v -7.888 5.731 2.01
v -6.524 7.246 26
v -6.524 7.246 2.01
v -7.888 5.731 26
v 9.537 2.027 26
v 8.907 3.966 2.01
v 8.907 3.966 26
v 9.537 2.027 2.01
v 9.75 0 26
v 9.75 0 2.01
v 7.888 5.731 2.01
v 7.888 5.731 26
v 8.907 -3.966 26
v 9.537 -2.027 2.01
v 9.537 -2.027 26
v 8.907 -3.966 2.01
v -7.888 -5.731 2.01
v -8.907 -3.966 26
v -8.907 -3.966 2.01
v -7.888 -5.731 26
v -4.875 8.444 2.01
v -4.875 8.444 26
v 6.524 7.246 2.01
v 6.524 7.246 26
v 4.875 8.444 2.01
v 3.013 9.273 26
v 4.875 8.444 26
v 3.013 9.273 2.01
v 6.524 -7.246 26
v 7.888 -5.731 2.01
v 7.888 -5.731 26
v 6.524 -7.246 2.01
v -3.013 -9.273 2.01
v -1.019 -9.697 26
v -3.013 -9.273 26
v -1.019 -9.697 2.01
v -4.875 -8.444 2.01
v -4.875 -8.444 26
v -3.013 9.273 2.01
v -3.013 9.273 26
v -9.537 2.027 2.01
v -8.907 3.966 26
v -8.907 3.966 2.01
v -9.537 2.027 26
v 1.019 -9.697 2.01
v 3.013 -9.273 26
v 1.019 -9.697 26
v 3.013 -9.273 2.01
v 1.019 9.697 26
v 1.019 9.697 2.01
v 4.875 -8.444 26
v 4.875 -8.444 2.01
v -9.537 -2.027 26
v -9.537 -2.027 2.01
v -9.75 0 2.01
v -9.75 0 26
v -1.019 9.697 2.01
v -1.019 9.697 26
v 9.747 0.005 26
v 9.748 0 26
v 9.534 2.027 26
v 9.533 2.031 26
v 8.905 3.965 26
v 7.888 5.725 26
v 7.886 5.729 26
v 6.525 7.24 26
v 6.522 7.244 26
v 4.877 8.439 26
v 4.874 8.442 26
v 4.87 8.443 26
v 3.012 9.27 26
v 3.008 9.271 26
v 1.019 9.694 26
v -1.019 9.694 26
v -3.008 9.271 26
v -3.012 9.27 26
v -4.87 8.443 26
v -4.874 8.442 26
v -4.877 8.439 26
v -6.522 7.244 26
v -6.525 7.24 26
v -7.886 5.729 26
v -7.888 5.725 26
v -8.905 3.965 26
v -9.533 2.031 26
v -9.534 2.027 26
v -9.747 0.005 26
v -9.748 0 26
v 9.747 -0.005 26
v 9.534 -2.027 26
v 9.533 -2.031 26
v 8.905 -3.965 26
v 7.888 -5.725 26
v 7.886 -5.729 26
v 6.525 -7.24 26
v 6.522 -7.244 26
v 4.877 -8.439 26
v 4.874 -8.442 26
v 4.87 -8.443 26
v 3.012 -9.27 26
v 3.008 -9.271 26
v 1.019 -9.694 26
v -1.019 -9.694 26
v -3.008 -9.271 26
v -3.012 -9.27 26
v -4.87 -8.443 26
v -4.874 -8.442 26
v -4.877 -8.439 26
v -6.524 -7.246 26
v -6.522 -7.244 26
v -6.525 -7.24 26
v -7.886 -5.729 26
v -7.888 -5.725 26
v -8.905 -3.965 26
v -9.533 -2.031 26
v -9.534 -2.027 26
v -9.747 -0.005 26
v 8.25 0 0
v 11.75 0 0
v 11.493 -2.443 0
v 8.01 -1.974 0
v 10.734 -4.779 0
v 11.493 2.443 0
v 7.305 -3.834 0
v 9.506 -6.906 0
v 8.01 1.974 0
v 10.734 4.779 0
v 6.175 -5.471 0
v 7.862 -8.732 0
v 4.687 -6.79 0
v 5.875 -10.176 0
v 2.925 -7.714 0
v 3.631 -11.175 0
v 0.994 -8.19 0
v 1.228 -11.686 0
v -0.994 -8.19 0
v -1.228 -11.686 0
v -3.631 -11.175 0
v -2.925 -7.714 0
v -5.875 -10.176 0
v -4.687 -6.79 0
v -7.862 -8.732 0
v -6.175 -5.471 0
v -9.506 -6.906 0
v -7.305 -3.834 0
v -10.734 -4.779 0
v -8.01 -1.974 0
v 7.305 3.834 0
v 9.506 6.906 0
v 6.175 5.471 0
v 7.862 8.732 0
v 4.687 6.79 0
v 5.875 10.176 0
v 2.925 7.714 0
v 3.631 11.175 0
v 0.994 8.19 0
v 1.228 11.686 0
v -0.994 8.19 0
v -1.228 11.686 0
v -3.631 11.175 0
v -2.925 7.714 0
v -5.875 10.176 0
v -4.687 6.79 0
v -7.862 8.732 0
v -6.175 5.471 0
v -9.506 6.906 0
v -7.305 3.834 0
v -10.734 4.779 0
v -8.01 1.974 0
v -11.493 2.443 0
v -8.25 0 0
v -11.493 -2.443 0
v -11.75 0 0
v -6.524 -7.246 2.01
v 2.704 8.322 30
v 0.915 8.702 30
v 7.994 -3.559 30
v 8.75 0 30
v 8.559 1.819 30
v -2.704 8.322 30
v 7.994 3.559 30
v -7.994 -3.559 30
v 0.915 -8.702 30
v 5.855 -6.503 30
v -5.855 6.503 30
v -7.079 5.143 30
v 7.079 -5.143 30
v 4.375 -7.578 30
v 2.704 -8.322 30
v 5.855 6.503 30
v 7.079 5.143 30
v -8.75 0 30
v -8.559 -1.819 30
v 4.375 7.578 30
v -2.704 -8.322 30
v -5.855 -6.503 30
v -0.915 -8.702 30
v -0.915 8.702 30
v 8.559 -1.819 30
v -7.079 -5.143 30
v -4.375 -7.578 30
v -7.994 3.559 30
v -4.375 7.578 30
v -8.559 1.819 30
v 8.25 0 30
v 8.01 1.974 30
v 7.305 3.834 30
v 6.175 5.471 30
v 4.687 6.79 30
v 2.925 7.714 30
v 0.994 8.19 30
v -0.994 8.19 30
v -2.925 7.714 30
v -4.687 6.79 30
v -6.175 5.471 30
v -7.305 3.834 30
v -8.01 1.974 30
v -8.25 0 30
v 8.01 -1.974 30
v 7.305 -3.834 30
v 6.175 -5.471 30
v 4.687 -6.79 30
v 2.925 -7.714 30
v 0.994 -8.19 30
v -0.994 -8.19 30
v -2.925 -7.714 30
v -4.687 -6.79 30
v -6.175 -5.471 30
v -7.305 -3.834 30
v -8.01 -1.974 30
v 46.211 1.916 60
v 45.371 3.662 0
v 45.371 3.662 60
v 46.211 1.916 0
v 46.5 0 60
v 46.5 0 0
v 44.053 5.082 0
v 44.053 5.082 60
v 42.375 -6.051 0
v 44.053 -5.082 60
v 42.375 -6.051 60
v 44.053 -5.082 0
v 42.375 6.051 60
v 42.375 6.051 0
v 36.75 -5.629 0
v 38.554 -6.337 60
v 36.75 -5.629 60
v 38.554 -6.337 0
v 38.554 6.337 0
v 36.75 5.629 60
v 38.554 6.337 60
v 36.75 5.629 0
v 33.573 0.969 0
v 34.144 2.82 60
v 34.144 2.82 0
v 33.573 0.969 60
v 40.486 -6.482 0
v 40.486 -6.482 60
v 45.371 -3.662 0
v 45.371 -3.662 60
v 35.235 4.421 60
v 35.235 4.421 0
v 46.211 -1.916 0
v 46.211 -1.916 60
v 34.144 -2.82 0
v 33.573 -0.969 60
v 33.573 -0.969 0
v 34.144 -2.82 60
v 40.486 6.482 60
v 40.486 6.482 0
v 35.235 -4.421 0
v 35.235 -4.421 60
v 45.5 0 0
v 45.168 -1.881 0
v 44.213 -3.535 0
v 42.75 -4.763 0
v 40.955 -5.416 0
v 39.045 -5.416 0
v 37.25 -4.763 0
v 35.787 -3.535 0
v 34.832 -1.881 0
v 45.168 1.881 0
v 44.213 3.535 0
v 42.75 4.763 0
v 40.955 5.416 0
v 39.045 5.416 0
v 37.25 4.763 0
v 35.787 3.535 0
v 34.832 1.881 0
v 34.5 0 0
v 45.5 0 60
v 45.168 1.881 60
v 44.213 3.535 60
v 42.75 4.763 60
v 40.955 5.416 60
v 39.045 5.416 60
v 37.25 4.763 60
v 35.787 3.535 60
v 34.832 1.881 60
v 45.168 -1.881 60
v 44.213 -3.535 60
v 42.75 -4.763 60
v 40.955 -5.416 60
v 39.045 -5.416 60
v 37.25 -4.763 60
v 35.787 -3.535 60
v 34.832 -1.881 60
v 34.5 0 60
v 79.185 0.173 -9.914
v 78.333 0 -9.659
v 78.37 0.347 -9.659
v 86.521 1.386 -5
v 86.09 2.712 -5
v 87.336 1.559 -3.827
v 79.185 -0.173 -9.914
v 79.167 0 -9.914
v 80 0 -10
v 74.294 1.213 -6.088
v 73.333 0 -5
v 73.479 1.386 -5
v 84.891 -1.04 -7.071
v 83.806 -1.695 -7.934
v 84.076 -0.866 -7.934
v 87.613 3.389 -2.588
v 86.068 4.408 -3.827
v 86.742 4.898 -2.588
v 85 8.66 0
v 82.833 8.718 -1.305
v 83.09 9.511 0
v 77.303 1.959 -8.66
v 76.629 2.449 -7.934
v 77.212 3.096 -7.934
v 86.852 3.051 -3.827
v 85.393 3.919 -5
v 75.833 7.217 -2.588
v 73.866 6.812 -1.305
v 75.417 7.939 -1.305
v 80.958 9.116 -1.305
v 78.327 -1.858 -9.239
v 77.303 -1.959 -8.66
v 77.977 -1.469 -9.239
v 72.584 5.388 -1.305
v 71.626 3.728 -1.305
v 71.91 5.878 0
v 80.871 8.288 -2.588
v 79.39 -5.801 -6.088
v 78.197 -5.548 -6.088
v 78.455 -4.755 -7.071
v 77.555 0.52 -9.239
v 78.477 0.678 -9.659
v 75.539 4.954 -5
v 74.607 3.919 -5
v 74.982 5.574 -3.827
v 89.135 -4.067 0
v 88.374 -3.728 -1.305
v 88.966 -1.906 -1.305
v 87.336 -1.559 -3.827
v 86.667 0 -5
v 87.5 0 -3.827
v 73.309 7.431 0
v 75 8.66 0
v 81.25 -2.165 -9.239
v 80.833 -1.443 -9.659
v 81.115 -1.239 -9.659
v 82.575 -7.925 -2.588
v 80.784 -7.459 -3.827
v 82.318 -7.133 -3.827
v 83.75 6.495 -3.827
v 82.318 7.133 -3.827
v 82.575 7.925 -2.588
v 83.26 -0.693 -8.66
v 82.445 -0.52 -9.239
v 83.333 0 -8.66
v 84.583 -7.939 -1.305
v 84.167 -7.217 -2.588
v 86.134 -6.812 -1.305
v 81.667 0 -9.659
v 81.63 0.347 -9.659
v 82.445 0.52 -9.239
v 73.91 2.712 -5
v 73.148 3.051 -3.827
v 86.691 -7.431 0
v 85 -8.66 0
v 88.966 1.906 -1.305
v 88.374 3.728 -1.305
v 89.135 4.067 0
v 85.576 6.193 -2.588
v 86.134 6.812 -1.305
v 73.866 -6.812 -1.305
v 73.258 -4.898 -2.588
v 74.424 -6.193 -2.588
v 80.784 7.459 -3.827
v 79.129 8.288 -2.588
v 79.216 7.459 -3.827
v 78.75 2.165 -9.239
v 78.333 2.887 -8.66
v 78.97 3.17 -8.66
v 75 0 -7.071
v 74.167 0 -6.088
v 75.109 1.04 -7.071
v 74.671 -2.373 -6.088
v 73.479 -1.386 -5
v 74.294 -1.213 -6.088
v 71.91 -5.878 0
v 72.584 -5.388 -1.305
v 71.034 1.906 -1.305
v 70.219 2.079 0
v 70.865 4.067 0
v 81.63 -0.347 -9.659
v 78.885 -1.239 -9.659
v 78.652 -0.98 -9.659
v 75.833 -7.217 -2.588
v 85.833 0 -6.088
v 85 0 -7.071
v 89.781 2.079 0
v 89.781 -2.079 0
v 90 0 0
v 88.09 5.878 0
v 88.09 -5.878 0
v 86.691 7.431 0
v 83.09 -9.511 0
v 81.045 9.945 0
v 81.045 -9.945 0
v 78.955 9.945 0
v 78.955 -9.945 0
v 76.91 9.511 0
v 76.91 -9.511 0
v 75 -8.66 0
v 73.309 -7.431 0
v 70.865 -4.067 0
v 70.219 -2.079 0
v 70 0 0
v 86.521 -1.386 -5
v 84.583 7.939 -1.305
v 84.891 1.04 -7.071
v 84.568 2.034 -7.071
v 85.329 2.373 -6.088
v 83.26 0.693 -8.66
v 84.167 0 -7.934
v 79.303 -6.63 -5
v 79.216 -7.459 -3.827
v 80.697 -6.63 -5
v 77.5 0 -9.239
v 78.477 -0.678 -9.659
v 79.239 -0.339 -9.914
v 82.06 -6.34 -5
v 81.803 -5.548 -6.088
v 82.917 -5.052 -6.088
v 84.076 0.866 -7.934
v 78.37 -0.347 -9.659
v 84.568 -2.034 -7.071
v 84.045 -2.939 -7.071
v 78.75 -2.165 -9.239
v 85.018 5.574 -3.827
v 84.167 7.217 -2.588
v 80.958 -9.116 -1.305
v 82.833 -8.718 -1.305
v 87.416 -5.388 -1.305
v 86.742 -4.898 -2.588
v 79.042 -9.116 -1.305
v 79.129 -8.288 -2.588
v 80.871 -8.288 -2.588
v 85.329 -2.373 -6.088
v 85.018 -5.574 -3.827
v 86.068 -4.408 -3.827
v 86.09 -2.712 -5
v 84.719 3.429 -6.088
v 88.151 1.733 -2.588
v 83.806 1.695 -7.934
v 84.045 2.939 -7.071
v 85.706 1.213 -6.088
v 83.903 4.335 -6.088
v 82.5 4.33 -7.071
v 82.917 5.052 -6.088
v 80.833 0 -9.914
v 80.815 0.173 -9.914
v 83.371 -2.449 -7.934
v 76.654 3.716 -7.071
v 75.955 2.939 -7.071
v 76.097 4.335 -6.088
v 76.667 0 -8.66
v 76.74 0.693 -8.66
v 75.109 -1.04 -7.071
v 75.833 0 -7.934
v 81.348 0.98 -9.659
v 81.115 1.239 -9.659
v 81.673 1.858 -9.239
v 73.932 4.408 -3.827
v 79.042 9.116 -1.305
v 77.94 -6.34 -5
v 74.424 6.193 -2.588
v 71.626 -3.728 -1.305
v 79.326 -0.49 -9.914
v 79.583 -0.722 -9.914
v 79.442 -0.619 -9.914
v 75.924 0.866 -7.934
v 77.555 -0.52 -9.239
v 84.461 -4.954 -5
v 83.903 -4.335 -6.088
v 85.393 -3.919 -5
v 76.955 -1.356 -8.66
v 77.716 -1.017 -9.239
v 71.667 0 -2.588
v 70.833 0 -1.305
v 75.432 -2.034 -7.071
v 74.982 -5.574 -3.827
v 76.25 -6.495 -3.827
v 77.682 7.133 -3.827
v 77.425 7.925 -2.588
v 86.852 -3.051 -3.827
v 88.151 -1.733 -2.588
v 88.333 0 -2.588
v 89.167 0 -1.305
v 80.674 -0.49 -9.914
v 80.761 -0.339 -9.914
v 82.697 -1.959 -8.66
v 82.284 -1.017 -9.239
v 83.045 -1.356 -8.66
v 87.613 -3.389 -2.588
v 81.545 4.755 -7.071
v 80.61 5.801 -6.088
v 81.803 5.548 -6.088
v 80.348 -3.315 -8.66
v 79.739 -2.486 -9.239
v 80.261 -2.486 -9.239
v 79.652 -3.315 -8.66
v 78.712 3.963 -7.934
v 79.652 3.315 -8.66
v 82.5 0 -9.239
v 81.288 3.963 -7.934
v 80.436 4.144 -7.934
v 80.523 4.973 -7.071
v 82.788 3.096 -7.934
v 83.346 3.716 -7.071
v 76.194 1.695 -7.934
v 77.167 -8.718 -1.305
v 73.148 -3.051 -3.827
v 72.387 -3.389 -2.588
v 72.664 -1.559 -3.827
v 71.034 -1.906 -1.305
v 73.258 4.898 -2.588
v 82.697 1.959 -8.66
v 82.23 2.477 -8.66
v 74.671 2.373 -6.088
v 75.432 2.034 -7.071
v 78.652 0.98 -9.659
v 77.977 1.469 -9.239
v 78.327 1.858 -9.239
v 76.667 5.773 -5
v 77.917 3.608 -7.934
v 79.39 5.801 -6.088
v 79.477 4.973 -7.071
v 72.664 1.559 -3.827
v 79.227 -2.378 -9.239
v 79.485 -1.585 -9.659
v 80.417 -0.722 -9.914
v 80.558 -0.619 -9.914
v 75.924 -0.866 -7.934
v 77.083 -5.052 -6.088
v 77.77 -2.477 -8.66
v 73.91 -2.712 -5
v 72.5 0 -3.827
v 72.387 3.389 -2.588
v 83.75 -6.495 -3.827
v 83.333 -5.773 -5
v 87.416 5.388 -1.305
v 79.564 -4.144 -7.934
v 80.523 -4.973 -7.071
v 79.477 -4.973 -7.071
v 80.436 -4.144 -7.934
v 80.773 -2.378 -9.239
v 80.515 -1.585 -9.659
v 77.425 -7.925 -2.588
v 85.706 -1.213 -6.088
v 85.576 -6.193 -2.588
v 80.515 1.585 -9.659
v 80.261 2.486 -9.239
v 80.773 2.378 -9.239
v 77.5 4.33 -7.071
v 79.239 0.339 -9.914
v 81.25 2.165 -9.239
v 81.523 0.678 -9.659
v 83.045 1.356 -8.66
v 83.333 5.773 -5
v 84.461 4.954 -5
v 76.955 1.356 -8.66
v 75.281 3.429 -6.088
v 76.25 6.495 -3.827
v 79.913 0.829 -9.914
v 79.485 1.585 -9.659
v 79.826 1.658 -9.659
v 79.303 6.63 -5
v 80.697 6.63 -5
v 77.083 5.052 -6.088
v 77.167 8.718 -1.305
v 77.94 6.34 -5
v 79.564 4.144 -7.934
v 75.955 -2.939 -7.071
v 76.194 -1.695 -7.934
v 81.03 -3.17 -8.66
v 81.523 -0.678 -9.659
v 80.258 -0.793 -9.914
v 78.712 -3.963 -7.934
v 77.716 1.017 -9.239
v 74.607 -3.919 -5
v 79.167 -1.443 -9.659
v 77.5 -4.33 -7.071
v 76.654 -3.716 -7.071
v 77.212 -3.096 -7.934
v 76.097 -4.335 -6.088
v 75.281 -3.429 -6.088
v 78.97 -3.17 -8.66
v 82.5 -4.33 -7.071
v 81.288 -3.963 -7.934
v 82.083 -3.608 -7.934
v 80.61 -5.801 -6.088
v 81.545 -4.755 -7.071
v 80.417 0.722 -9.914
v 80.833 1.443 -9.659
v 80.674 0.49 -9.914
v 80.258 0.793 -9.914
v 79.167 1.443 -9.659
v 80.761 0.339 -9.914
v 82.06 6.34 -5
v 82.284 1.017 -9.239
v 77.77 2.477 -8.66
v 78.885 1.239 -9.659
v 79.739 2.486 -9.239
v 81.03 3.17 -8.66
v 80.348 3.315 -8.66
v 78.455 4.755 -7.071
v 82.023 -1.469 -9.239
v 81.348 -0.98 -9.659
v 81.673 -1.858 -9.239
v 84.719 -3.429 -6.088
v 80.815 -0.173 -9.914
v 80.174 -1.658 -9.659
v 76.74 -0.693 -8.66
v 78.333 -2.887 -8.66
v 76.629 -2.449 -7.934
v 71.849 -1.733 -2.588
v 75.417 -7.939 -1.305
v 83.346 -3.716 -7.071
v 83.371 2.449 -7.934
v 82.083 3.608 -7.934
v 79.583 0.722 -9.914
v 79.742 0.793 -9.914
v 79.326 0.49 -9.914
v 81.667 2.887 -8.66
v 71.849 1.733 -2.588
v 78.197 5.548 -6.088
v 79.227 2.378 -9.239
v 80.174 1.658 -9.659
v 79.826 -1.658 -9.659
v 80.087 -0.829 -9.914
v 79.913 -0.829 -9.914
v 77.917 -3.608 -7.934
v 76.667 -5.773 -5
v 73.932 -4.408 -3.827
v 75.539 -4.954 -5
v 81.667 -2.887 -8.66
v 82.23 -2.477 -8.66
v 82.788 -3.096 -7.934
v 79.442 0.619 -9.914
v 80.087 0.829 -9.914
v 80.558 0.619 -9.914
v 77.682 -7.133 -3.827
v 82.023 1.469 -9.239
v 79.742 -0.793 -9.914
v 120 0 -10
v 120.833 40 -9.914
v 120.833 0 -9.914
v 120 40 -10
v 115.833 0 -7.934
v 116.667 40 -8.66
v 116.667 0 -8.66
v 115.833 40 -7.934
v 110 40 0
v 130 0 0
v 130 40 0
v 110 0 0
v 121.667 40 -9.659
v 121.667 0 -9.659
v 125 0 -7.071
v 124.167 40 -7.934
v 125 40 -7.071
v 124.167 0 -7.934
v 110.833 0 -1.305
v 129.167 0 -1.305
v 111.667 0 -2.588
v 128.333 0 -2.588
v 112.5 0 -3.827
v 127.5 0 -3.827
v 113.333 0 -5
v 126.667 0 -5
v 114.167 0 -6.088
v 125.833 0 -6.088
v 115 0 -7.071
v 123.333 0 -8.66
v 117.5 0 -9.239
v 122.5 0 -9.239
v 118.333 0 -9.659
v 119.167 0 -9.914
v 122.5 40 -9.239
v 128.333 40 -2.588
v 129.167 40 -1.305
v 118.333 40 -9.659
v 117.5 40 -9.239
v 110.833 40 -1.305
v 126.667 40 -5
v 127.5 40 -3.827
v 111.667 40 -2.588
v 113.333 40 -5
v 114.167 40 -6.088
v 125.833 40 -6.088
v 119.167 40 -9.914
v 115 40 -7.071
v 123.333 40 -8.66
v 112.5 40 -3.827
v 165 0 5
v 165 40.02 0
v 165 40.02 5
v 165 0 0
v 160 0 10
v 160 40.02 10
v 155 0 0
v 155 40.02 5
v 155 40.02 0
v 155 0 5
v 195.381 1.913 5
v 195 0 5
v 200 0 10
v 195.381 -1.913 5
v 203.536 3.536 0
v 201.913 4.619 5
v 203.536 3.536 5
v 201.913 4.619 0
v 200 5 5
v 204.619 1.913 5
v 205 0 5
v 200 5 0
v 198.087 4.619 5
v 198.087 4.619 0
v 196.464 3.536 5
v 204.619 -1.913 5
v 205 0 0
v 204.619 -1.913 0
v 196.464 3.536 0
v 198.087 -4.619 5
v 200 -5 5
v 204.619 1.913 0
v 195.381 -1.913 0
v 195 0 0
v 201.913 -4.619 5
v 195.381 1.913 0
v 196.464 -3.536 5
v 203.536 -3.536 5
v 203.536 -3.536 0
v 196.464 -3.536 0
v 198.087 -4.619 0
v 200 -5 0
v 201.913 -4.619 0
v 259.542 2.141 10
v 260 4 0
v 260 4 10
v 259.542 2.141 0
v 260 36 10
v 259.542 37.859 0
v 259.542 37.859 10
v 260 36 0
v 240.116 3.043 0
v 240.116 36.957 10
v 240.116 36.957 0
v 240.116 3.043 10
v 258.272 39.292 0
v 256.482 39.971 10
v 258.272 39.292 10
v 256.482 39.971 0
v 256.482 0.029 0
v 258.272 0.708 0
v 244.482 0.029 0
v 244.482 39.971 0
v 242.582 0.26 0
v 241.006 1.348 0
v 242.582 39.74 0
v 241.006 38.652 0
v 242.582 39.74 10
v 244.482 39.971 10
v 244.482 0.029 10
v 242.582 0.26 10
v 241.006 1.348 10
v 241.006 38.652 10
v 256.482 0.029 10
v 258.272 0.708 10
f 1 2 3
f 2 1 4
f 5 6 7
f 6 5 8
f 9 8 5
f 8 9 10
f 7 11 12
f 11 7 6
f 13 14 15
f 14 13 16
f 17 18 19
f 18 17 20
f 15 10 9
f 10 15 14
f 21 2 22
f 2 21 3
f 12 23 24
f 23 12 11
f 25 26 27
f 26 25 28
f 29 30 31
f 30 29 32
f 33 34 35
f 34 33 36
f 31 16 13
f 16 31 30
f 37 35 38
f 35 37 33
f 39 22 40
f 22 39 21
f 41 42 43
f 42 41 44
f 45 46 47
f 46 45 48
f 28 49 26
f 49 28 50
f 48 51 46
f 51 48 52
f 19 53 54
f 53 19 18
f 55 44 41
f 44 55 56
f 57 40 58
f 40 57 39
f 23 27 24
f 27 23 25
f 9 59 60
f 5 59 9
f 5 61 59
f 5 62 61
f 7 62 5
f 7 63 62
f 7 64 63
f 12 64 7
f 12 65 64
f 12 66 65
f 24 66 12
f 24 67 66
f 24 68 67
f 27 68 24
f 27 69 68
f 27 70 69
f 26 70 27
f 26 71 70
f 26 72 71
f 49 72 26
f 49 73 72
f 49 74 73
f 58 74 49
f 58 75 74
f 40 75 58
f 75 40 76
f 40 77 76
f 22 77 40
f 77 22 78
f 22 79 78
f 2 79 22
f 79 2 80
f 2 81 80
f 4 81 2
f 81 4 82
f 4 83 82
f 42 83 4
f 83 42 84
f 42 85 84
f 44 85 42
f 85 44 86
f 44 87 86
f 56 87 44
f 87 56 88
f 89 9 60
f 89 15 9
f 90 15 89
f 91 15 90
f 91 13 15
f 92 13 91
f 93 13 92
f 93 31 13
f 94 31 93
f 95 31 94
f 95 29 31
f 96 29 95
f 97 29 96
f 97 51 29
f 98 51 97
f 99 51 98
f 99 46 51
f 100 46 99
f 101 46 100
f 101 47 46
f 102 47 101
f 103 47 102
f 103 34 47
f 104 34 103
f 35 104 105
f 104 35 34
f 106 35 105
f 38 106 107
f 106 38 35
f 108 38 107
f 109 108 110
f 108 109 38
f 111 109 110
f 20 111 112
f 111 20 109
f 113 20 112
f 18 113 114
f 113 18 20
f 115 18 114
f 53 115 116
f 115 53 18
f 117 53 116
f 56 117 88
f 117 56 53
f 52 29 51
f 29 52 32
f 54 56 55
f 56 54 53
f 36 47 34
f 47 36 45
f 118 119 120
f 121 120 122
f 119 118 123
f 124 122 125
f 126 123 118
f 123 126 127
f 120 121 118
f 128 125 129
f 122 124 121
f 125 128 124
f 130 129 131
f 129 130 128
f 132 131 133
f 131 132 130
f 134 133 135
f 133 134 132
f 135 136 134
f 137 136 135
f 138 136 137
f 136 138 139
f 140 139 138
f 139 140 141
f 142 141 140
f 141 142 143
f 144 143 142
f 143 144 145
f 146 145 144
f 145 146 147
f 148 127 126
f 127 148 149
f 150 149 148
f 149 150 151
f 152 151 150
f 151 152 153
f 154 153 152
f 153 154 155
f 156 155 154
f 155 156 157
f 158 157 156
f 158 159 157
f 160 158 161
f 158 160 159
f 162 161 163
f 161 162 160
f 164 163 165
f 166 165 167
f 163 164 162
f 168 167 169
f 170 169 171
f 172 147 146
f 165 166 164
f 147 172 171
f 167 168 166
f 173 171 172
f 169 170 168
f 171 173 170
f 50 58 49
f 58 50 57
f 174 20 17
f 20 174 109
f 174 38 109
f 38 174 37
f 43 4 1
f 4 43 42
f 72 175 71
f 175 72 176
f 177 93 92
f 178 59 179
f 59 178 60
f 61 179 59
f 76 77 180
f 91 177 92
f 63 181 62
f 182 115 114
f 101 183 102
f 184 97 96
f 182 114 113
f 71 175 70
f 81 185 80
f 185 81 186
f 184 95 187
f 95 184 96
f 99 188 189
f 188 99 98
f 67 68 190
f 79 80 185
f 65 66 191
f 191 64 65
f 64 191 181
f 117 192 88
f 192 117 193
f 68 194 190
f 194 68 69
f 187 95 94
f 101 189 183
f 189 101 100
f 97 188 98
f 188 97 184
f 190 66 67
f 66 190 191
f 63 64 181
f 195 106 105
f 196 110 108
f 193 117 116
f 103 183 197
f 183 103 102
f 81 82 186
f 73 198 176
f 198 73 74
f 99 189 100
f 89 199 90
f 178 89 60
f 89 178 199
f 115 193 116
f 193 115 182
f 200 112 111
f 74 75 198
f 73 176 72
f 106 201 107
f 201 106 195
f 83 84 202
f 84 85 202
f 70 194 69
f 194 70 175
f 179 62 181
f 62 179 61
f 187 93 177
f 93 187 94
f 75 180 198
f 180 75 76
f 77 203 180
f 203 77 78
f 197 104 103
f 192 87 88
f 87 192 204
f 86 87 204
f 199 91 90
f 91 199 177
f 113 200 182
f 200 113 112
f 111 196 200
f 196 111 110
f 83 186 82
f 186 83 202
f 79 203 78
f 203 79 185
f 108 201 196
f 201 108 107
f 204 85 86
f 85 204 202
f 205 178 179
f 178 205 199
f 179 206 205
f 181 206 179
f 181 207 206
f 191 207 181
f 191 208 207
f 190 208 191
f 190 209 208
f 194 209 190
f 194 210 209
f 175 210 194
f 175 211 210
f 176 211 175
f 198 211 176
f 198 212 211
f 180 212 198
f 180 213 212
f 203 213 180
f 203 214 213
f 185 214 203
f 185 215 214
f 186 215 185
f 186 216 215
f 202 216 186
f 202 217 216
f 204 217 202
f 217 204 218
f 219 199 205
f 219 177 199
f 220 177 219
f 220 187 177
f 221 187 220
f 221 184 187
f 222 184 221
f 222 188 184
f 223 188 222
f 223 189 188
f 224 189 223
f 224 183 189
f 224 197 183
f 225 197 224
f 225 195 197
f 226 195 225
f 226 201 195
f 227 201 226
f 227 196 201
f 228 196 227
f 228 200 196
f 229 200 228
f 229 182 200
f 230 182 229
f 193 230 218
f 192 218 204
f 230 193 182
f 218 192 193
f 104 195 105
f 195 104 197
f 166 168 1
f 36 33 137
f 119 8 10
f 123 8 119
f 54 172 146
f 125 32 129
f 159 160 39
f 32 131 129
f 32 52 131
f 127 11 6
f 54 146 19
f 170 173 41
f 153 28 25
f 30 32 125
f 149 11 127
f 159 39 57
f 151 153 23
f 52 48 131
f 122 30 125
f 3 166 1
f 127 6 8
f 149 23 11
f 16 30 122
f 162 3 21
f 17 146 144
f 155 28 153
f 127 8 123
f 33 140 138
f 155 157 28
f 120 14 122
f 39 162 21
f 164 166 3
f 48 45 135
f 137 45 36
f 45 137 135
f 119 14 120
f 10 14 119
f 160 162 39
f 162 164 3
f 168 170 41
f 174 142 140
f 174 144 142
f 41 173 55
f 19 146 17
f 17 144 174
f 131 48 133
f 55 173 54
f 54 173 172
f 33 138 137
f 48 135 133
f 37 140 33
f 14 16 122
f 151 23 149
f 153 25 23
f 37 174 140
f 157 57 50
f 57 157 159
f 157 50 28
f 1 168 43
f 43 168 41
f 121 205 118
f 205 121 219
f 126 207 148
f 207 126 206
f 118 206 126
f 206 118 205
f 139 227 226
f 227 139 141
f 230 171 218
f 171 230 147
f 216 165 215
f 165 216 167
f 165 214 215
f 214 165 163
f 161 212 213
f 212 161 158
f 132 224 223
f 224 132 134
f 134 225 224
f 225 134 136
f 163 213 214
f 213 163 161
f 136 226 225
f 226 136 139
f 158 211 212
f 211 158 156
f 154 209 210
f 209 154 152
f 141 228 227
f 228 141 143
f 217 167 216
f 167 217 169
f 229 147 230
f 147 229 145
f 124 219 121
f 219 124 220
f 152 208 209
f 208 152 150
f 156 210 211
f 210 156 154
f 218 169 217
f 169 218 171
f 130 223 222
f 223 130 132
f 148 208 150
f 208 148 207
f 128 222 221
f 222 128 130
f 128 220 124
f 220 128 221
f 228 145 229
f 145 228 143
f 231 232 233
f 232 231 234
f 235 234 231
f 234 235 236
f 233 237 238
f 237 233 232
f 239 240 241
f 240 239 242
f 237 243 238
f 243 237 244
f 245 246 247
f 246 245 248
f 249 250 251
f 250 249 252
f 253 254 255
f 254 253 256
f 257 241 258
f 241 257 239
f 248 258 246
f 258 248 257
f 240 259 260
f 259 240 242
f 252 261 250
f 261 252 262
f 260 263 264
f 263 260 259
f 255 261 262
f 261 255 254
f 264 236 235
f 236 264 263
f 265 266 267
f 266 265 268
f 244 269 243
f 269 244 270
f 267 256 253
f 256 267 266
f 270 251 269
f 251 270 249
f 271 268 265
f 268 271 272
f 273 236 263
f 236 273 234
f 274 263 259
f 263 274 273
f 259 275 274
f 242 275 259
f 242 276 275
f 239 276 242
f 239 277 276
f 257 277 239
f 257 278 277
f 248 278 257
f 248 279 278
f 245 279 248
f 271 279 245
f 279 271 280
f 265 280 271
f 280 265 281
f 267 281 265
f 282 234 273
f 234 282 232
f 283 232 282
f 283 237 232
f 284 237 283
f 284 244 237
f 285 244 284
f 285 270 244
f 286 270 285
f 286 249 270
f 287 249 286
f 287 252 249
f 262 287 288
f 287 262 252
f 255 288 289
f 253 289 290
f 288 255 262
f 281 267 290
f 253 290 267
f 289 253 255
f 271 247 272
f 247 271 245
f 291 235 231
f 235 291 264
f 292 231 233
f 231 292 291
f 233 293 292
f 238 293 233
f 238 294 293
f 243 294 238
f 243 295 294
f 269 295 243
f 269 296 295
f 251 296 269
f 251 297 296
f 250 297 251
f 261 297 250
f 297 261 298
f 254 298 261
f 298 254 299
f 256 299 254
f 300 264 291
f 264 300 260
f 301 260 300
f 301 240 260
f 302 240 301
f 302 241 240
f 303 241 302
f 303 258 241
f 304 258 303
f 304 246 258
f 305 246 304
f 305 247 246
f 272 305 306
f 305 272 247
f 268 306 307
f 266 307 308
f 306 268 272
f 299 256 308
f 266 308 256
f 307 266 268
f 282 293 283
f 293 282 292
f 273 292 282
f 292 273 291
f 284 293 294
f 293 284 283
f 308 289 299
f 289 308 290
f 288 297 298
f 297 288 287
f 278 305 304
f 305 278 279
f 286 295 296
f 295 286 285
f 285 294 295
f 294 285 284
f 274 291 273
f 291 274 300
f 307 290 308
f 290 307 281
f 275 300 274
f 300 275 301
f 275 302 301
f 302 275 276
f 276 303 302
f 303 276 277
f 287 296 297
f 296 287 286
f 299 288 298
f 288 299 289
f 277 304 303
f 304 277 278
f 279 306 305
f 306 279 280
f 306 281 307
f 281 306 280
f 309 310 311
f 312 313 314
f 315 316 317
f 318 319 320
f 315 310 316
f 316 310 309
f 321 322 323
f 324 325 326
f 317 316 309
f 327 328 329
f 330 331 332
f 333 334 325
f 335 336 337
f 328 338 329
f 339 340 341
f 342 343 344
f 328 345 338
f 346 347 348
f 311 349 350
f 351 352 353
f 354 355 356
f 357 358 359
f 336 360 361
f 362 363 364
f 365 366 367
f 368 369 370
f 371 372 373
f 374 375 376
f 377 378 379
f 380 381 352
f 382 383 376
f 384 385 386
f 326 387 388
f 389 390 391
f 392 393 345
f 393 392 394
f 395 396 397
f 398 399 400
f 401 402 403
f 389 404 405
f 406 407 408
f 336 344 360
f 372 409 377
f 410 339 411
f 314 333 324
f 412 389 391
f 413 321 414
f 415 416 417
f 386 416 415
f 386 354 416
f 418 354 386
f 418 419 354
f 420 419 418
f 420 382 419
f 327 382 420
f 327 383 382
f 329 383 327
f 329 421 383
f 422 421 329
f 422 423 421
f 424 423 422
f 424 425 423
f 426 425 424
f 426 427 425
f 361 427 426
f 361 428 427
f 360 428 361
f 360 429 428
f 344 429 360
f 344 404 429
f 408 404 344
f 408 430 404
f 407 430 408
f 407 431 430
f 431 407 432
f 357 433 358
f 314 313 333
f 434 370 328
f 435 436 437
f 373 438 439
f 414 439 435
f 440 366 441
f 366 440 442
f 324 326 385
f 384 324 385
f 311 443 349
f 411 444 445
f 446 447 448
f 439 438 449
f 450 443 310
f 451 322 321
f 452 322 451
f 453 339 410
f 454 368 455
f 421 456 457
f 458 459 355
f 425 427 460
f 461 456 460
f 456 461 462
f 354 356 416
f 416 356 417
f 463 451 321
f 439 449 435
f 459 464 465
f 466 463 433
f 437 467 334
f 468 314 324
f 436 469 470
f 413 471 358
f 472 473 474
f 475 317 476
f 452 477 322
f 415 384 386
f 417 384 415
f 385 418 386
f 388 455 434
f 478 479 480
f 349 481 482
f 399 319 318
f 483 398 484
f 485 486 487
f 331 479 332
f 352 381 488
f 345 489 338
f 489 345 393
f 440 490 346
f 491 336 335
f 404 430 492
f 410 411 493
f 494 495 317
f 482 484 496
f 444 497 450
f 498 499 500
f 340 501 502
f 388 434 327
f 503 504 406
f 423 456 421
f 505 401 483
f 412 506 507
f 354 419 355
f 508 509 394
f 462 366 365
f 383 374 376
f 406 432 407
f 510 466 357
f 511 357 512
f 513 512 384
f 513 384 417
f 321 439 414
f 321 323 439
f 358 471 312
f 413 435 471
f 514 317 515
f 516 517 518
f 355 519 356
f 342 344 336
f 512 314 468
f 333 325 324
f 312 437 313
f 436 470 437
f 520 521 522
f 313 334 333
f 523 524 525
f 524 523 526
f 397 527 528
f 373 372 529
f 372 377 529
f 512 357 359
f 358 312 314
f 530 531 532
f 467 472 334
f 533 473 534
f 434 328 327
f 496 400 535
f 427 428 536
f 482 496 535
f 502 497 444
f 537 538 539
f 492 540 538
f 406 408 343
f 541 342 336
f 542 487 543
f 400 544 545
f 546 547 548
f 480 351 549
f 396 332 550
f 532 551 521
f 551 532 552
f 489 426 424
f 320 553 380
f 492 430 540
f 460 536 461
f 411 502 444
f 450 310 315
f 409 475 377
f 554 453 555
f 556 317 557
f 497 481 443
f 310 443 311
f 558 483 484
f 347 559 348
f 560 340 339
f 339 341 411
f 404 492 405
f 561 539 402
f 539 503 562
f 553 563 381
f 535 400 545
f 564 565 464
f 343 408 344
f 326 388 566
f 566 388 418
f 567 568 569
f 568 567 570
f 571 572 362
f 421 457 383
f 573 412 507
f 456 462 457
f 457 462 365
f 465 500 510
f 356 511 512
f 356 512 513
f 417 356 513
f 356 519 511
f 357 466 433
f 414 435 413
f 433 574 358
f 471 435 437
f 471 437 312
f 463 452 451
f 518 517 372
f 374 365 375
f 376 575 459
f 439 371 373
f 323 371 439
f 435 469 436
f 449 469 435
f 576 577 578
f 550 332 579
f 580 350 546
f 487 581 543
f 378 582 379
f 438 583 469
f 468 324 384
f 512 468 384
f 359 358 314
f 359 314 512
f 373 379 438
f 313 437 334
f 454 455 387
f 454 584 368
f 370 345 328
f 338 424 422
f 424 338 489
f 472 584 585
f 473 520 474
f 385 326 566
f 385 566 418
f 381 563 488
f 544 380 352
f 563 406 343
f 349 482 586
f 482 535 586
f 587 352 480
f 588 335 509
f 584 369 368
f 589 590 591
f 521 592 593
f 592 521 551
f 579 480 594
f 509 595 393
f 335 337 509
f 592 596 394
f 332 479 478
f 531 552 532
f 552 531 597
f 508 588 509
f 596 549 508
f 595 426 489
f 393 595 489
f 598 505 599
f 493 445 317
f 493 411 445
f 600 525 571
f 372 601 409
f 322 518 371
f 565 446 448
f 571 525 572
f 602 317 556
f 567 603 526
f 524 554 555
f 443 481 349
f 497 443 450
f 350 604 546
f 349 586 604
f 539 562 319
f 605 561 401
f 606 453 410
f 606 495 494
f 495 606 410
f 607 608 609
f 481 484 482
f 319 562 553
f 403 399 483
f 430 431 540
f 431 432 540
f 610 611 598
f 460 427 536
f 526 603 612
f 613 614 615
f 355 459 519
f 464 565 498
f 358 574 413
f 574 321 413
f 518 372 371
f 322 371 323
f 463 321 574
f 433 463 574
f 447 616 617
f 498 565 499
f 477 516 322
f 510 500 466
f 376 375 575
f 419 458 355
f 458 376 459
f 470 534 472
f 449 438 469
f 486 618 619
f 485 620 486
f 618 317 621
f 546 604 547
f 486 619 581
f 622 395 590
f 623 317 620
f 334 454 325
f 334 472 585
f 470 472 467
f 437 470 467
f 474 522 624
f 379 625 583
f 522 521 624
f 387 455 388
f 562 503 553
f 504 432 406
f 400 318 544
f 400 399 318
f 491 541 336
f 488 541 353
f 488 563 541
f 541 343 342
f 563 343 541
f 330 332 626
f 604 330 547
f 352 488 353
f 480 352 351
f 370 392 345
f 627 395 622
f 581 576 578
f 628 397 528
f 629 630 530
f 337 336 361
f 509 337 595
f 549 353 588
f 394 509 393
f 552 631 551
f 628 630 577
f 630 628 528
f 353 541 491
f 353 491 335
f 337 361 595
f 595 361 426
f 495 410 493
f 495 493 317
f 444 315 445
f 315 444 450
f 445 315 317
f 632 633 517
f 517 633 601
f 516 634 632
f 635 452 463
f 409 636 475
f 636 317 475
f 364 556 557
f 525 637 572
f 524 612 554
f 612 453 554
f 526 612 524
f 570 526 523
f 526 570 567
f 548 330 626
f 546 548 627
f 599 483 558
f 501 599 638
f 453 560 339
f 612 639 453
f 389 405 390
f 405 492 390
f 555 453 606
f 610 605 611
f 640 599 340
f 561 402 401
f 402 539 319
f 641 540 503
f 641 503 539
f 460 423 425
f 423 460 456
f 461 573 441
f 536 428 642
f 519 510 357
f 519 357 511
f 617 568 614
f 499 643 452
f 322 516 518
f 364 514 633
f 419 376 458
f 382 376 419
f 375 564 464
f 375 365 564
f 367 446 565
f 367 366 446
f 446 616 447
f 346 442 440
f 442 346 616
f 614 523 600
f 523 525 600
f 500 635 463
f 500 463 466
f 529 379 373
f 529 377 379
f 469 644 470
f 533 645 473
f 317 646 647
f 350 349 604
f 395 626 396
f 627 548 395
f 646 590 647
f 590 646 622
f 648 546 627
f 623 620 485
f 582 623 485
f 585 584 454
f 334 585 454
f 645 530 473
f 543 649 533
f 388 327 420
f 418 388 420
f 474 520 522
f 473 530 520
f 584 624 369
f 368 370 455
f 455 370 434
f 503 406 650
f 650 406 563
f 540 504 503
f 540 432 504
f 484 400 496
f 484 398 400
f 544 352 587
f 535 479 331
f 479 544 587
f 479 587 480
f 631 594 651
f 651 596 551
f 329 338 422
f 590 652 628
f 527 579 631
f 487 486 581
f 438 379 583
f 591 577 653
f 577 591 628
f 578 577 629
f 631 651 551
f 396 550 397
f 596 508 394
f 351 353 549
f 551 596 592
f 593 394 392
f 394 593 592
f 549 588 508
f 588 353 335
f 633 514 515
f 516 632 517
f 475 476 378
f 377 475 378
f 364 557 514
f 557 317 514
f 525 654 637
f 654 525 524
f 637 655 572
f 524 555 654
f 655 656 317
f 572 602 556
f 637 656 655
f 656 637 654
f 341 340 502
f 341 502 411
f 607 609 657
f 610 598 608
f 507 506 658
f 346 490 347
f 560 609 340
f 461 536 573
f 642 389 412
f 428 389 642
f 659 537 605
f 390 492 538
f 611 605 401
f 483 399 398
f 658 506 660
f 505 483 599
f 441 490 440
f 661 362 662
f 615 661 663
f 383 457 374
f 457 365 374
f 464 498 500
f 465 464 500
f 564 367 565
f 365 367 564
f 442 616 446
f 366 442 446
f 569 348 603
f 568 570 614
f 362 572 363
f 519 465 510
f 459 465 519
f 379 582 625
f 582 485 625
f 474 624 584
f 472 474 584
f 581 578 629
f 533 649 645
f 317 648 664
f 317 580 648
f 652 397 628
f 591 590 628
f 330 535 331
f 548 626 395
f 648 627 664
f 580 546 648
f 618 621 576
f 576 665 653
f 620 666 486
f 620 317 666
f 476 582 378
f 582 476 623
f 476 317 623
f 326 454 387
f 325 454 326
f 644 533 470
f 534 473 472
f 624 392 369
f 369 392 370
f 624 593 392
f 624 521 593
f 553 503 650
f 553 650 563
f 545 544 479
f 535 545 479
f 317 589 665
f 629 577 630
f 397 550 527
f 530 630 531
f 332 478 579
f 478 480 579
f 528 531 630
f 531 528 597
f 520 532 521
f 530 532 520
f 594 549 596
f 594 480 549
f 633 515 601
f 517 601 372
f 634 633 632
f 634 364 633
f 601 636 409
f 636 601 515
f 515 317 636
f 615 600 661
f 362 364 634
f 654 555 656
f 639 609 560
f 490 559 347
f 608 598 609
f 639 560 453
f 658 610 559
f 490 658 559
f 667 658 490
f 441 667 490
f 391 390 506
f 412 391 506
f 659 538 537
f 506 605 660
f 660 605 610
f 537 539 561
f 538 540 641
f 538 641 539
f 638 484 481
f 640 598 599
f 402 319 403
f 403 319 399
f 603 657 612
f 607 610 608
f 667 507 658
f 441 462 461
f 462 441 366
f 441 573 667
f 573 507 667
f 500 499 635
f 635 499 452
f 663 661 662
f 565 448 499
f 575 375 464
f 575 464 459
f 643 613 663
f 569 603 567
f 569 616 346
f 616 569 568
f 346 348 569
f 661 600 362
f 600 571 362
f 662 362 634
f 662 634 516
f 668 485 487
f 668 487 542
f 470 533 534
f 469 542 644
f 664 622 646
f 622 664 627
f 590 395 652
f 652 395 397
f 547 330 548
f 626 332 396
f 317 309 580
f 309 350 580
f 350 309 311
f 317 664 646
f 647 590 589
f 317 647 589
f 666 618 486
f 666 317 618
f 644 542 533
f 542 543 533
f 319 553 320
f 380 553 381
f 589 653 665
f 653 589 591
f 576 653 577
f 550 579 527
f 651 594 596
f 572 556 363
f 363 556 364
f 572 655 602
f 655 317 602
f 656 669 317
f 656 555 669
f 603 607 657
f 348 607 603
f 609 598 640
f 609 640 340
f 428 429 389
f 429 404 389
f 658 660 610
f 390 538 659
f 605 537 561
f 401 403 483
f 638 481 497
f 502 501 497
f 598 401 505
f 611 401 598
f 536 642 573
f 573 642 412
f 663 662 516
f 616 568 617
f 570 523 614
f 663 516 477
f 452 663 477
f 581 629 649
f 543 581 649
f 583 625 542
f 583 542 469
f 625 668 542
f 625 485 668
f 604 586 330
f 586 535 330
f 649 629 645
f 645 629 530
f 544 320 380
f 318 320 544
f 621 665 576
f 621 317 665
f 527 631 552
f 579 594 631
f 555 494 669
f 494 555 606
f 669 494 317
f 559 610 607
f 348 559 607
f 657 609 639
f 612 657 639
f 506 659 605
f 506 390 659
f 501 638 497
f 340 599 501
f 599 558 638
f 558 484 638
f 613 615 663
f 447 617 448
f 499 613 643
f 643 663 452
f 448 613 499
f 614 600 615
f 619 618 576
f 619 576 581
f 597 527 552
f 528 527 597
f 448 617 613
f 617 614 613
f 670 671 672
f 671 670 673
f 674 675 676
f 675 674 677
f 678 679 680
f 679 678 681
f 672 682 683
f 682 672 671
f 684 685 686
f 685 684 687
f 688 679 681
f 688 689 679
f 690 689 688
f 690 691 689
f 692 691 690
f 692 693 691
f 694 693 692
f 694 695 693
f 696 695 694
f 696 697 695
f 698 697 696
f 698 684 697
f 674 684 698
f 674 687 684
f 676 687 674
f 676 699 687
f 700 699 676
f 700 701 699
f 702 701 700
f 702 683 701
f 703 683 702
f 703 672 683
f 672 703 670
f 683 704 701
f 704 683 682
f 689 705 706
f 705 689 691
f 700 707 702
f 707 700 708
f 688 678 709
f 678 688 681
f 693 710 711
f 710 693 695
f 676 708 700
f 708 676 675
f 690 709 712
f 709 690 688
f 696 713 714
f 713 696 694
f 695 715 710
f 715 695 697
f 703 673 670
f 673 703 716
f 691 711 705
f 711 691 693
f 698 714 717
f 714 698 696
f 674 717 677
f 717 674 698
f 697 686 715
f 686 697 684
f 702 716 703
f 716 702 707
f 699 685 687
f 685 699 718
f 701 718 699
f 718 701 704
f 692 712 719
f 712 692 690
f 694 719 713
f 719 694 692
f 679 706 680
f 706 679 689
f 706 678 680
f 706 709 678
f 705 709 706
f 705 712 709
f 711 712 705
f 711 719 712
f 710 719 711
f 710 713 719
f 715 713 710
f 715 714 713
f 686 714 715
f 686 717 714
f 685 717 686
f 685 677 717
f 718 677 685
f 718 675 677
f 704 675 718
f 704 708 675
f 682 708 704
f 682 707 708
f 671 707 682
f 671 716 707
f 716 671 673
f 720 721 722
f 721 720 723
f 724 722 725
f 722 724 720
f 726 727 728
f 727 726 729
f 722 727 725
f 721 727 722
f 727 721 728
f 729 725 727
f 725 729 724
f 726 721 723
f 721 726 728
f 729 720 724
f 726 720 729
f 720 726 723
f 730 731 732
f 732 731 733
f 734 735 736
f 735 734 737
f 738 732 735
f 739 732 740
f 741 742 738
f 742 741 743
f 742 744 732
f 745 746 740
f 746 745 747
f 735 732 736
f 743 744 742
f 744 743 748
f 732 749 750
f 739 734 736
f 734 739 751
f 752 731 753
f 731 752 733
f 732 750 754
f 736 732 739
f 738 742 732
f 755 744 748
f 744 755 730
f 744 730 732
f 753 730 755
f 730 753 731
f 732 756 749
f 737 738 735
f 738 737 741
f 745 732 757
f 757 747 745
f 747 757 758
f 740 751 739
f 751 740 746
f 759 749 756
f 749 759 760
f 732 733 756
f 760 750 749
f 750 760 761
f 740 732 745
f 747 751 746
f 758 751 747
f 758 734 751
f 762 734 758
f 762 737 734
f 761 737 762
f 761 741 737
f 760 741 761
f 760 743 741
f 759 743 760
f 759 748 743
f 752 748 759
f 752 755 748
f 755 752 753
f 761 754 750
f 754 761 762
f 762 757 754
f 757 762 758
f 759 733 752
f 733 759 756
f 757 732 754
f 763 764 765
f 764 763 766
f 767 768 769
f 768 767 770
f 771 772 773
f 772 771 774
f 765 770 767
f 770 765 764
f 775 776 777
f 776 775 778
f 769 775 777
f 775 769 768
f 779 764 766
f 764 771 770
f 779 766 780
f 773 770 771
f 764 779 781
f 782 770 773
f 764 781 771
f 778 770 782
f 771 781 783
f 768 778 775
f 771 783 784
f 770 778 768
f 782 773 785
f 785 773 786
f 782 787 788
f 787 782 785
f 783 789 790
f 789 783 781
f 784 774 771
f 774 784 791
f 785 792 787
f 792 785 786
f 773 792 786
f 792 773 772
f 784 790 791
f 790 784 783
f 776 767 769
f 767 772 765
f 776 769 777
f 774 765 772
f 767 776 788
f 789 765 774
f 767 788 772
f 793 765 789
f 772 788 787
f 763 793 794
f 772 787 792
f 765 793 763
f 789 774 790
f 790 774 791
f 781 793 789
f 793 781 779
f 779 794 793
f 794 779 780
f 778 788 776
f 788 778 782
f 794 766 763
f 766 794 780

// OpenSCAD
/*
Copyright (c) 2020, Joris Robijn
All rights reserved.

Redistribution and use in source and binary forms, with or without
modification, are permitted provided that the following conditions are met:
    * Redistributions of source code must retain the above copyright
      notice, this list of conditions and the following disclaimer.
    * Redistributions in binary form must reproduce the above copyright
      notice, this list of conditions and the following disclaimer in the
      documentation and/or other materials provided with the distribution.

THIS SOFTWARE IS PROVIDED BY THE COPYRIGHT HOLDERS AND CONTRIBUTORS "AS IS" AND
ANY EXPRESS OR IMPLIED WARRANTIES, INCLUDING, BUT NOT LIMITED TO, THE IMPLIED
WARRANTIES OF MERCHANTABILITY AND FITNESS FOR A PARTICULAR PURPOSE ARE
DISCLAIMED. IN NO EVENT SHALL THE COPYRIGHT HOLDER BE LIABLE FOR ANY
DIRECT, INDIRECT, INCIDENTAL, SPECIAL, EXEMPLARY, OR CONSEQUENTIAL DAMAGES
(INCLUDING, BUT NOT LIMITED TO, PROCUREMENT OF SUBSTITUTE GOODS OR SERVICES;
LOSS OF USE, DATA, OR PROFITS; OR BUSINESS INTERRUPTION) HOWEVER CAUSED AND
ON ANY THEORY OF LIABILITY, WHETHER IN CONTRACT, STRICT LIABILITY, OR TORT
(INCLUDING NEGLIGENCE OR OTHERWISE) ARISING IN ANY WAY OUT OF THE USE OF THIS
SOFTWARE, EVEN IF ADVISED OF THE POSSIBILITY OF SUCH DAMAGE.
*/

module tube( d1=11, d2=13, h=60 )
{
	difference() {
		cylinder( d=d2, h=h );
		translate( [0,0,-0.01] ) cylinder( d=d1, h=h+0.02 );
	}
}

module hosetail( d1=16.5, d2=19.5, h=30, top_narrowing_th=1, top_narrowing_height=4, bottom_base_extension=4, bottom_base_height=2, bottom_inner_widening=0 )
{
	difference() {
		union() {
			cylinder( d=d2, h=h-top_narrowing_height );
			translate( [0,0,h-top_narrowing_height-0.01] ) cylinder( d2=d1+top_narrowing_th, d1=d2, h=top_narrowing_height+0.01 );
			cylinder( d2=d2, d1=d2+bottom_base_extension, h=bottom_base_height+0.01 );
		}
		translate( [0,0,-0.01] ) cylinder( d=d1, h=h+0.02 );
		translate( [0,0,-0.01] ) cylinder( d2=d1, d1=d1+bottom_inner_widening, h=bottom_inner_widening/2 );
	}
}

module sine_hole( d=20, depth=10)
// To be used as negative.
{
	max_i=12;
	p=concat( [[0,0]],[ for( i=[0:1:max_i+0.01] ) [d/2*i/max_i,depth*(-cos( i*90/max_i ))] ], [[d/2,0]] );

	rotate_extrude() polygon( p );
}

module sine_trench( w=20, l=40, depth=10)
// To be used as negative.
{
	max_i=24;
	p=concat( [[-w/2,0]],[ for( i=[0:1:max_i+0.01] ) [-w/2+w*i/max_i,depth*( +cos( 90+i*180/max_i ))] ], [[+w/2,0]] );

	rotate( [90,0,180] )
		linear_extrude( height=l ) polygon( p );
}

module corridor( w=10, l=40, h=10, f=0, b=0 )
// Makes a corridor with a 45 degrees roof.
// To be used as negative.
// f specifies flattening at the top, for if used as positive.
// b specifies base extension, for if used as positive.
{
	//rotate( [0,-90,-90] )
	rotate( [90,0,180] )
		linear_extrude( l+0.02 ) polygon( [[-w/2-b,0],[-w/2,b],[-w/2,h-w/2],[-f,h-f],[0,h-f],[+f,h-f],[w/2,h-w/2],[w/2,b],[w/2+b,0]] );
}

module corridor_joint( w=10, h=10, f=0, b=0 )
// Makes a corridor joint with a 45 degrees roof.
// To be used as negative.
// f specifies flattening at the top, for if used as positive.
// b specifies base extension, for if used as positive.
{
	rotate_extrude() polygon( [[0,0],[0,h-f],[f,h-f],[w/2,h-w/2],[w/2,b],[w/2+b,0]] );
}

module rounded_rectangle( x=20, y=40, h=10, r=4 )
{
	hull() {
		translate( [r, r, 0] ) cylinder( r=r, h=h );
		translate( [x-r, r, 0] ) cylinder( r=r, h=h );
		translate( [x-r, y-r, 0] ) cylinder( r=r, h=h );
		translate( [r, y-r, 0] ) cylinder( r=r, h=h );
	}
}
function 2D_length( p0, p1 ) = sqrt( pow( p1[1] - p0[1], 2 ) + pow( p1[0] - p0[0], 2 ) );

function 2D_angle( p0, p1 ) =  -90+atan2( p1[1] - p0[1], p1[0] - p0[0] );

hosetail();

translate( [40,0,0] ) tube();

translate( [80,0,0] ) sine_hole();

translate( [120,0,0] ) sine_trench();

translate( [160,0,0] ) corridor();

translate( [200,0,0] ) corridor_joint();

translate( [240,0,0] ) rounded_rectangle();
